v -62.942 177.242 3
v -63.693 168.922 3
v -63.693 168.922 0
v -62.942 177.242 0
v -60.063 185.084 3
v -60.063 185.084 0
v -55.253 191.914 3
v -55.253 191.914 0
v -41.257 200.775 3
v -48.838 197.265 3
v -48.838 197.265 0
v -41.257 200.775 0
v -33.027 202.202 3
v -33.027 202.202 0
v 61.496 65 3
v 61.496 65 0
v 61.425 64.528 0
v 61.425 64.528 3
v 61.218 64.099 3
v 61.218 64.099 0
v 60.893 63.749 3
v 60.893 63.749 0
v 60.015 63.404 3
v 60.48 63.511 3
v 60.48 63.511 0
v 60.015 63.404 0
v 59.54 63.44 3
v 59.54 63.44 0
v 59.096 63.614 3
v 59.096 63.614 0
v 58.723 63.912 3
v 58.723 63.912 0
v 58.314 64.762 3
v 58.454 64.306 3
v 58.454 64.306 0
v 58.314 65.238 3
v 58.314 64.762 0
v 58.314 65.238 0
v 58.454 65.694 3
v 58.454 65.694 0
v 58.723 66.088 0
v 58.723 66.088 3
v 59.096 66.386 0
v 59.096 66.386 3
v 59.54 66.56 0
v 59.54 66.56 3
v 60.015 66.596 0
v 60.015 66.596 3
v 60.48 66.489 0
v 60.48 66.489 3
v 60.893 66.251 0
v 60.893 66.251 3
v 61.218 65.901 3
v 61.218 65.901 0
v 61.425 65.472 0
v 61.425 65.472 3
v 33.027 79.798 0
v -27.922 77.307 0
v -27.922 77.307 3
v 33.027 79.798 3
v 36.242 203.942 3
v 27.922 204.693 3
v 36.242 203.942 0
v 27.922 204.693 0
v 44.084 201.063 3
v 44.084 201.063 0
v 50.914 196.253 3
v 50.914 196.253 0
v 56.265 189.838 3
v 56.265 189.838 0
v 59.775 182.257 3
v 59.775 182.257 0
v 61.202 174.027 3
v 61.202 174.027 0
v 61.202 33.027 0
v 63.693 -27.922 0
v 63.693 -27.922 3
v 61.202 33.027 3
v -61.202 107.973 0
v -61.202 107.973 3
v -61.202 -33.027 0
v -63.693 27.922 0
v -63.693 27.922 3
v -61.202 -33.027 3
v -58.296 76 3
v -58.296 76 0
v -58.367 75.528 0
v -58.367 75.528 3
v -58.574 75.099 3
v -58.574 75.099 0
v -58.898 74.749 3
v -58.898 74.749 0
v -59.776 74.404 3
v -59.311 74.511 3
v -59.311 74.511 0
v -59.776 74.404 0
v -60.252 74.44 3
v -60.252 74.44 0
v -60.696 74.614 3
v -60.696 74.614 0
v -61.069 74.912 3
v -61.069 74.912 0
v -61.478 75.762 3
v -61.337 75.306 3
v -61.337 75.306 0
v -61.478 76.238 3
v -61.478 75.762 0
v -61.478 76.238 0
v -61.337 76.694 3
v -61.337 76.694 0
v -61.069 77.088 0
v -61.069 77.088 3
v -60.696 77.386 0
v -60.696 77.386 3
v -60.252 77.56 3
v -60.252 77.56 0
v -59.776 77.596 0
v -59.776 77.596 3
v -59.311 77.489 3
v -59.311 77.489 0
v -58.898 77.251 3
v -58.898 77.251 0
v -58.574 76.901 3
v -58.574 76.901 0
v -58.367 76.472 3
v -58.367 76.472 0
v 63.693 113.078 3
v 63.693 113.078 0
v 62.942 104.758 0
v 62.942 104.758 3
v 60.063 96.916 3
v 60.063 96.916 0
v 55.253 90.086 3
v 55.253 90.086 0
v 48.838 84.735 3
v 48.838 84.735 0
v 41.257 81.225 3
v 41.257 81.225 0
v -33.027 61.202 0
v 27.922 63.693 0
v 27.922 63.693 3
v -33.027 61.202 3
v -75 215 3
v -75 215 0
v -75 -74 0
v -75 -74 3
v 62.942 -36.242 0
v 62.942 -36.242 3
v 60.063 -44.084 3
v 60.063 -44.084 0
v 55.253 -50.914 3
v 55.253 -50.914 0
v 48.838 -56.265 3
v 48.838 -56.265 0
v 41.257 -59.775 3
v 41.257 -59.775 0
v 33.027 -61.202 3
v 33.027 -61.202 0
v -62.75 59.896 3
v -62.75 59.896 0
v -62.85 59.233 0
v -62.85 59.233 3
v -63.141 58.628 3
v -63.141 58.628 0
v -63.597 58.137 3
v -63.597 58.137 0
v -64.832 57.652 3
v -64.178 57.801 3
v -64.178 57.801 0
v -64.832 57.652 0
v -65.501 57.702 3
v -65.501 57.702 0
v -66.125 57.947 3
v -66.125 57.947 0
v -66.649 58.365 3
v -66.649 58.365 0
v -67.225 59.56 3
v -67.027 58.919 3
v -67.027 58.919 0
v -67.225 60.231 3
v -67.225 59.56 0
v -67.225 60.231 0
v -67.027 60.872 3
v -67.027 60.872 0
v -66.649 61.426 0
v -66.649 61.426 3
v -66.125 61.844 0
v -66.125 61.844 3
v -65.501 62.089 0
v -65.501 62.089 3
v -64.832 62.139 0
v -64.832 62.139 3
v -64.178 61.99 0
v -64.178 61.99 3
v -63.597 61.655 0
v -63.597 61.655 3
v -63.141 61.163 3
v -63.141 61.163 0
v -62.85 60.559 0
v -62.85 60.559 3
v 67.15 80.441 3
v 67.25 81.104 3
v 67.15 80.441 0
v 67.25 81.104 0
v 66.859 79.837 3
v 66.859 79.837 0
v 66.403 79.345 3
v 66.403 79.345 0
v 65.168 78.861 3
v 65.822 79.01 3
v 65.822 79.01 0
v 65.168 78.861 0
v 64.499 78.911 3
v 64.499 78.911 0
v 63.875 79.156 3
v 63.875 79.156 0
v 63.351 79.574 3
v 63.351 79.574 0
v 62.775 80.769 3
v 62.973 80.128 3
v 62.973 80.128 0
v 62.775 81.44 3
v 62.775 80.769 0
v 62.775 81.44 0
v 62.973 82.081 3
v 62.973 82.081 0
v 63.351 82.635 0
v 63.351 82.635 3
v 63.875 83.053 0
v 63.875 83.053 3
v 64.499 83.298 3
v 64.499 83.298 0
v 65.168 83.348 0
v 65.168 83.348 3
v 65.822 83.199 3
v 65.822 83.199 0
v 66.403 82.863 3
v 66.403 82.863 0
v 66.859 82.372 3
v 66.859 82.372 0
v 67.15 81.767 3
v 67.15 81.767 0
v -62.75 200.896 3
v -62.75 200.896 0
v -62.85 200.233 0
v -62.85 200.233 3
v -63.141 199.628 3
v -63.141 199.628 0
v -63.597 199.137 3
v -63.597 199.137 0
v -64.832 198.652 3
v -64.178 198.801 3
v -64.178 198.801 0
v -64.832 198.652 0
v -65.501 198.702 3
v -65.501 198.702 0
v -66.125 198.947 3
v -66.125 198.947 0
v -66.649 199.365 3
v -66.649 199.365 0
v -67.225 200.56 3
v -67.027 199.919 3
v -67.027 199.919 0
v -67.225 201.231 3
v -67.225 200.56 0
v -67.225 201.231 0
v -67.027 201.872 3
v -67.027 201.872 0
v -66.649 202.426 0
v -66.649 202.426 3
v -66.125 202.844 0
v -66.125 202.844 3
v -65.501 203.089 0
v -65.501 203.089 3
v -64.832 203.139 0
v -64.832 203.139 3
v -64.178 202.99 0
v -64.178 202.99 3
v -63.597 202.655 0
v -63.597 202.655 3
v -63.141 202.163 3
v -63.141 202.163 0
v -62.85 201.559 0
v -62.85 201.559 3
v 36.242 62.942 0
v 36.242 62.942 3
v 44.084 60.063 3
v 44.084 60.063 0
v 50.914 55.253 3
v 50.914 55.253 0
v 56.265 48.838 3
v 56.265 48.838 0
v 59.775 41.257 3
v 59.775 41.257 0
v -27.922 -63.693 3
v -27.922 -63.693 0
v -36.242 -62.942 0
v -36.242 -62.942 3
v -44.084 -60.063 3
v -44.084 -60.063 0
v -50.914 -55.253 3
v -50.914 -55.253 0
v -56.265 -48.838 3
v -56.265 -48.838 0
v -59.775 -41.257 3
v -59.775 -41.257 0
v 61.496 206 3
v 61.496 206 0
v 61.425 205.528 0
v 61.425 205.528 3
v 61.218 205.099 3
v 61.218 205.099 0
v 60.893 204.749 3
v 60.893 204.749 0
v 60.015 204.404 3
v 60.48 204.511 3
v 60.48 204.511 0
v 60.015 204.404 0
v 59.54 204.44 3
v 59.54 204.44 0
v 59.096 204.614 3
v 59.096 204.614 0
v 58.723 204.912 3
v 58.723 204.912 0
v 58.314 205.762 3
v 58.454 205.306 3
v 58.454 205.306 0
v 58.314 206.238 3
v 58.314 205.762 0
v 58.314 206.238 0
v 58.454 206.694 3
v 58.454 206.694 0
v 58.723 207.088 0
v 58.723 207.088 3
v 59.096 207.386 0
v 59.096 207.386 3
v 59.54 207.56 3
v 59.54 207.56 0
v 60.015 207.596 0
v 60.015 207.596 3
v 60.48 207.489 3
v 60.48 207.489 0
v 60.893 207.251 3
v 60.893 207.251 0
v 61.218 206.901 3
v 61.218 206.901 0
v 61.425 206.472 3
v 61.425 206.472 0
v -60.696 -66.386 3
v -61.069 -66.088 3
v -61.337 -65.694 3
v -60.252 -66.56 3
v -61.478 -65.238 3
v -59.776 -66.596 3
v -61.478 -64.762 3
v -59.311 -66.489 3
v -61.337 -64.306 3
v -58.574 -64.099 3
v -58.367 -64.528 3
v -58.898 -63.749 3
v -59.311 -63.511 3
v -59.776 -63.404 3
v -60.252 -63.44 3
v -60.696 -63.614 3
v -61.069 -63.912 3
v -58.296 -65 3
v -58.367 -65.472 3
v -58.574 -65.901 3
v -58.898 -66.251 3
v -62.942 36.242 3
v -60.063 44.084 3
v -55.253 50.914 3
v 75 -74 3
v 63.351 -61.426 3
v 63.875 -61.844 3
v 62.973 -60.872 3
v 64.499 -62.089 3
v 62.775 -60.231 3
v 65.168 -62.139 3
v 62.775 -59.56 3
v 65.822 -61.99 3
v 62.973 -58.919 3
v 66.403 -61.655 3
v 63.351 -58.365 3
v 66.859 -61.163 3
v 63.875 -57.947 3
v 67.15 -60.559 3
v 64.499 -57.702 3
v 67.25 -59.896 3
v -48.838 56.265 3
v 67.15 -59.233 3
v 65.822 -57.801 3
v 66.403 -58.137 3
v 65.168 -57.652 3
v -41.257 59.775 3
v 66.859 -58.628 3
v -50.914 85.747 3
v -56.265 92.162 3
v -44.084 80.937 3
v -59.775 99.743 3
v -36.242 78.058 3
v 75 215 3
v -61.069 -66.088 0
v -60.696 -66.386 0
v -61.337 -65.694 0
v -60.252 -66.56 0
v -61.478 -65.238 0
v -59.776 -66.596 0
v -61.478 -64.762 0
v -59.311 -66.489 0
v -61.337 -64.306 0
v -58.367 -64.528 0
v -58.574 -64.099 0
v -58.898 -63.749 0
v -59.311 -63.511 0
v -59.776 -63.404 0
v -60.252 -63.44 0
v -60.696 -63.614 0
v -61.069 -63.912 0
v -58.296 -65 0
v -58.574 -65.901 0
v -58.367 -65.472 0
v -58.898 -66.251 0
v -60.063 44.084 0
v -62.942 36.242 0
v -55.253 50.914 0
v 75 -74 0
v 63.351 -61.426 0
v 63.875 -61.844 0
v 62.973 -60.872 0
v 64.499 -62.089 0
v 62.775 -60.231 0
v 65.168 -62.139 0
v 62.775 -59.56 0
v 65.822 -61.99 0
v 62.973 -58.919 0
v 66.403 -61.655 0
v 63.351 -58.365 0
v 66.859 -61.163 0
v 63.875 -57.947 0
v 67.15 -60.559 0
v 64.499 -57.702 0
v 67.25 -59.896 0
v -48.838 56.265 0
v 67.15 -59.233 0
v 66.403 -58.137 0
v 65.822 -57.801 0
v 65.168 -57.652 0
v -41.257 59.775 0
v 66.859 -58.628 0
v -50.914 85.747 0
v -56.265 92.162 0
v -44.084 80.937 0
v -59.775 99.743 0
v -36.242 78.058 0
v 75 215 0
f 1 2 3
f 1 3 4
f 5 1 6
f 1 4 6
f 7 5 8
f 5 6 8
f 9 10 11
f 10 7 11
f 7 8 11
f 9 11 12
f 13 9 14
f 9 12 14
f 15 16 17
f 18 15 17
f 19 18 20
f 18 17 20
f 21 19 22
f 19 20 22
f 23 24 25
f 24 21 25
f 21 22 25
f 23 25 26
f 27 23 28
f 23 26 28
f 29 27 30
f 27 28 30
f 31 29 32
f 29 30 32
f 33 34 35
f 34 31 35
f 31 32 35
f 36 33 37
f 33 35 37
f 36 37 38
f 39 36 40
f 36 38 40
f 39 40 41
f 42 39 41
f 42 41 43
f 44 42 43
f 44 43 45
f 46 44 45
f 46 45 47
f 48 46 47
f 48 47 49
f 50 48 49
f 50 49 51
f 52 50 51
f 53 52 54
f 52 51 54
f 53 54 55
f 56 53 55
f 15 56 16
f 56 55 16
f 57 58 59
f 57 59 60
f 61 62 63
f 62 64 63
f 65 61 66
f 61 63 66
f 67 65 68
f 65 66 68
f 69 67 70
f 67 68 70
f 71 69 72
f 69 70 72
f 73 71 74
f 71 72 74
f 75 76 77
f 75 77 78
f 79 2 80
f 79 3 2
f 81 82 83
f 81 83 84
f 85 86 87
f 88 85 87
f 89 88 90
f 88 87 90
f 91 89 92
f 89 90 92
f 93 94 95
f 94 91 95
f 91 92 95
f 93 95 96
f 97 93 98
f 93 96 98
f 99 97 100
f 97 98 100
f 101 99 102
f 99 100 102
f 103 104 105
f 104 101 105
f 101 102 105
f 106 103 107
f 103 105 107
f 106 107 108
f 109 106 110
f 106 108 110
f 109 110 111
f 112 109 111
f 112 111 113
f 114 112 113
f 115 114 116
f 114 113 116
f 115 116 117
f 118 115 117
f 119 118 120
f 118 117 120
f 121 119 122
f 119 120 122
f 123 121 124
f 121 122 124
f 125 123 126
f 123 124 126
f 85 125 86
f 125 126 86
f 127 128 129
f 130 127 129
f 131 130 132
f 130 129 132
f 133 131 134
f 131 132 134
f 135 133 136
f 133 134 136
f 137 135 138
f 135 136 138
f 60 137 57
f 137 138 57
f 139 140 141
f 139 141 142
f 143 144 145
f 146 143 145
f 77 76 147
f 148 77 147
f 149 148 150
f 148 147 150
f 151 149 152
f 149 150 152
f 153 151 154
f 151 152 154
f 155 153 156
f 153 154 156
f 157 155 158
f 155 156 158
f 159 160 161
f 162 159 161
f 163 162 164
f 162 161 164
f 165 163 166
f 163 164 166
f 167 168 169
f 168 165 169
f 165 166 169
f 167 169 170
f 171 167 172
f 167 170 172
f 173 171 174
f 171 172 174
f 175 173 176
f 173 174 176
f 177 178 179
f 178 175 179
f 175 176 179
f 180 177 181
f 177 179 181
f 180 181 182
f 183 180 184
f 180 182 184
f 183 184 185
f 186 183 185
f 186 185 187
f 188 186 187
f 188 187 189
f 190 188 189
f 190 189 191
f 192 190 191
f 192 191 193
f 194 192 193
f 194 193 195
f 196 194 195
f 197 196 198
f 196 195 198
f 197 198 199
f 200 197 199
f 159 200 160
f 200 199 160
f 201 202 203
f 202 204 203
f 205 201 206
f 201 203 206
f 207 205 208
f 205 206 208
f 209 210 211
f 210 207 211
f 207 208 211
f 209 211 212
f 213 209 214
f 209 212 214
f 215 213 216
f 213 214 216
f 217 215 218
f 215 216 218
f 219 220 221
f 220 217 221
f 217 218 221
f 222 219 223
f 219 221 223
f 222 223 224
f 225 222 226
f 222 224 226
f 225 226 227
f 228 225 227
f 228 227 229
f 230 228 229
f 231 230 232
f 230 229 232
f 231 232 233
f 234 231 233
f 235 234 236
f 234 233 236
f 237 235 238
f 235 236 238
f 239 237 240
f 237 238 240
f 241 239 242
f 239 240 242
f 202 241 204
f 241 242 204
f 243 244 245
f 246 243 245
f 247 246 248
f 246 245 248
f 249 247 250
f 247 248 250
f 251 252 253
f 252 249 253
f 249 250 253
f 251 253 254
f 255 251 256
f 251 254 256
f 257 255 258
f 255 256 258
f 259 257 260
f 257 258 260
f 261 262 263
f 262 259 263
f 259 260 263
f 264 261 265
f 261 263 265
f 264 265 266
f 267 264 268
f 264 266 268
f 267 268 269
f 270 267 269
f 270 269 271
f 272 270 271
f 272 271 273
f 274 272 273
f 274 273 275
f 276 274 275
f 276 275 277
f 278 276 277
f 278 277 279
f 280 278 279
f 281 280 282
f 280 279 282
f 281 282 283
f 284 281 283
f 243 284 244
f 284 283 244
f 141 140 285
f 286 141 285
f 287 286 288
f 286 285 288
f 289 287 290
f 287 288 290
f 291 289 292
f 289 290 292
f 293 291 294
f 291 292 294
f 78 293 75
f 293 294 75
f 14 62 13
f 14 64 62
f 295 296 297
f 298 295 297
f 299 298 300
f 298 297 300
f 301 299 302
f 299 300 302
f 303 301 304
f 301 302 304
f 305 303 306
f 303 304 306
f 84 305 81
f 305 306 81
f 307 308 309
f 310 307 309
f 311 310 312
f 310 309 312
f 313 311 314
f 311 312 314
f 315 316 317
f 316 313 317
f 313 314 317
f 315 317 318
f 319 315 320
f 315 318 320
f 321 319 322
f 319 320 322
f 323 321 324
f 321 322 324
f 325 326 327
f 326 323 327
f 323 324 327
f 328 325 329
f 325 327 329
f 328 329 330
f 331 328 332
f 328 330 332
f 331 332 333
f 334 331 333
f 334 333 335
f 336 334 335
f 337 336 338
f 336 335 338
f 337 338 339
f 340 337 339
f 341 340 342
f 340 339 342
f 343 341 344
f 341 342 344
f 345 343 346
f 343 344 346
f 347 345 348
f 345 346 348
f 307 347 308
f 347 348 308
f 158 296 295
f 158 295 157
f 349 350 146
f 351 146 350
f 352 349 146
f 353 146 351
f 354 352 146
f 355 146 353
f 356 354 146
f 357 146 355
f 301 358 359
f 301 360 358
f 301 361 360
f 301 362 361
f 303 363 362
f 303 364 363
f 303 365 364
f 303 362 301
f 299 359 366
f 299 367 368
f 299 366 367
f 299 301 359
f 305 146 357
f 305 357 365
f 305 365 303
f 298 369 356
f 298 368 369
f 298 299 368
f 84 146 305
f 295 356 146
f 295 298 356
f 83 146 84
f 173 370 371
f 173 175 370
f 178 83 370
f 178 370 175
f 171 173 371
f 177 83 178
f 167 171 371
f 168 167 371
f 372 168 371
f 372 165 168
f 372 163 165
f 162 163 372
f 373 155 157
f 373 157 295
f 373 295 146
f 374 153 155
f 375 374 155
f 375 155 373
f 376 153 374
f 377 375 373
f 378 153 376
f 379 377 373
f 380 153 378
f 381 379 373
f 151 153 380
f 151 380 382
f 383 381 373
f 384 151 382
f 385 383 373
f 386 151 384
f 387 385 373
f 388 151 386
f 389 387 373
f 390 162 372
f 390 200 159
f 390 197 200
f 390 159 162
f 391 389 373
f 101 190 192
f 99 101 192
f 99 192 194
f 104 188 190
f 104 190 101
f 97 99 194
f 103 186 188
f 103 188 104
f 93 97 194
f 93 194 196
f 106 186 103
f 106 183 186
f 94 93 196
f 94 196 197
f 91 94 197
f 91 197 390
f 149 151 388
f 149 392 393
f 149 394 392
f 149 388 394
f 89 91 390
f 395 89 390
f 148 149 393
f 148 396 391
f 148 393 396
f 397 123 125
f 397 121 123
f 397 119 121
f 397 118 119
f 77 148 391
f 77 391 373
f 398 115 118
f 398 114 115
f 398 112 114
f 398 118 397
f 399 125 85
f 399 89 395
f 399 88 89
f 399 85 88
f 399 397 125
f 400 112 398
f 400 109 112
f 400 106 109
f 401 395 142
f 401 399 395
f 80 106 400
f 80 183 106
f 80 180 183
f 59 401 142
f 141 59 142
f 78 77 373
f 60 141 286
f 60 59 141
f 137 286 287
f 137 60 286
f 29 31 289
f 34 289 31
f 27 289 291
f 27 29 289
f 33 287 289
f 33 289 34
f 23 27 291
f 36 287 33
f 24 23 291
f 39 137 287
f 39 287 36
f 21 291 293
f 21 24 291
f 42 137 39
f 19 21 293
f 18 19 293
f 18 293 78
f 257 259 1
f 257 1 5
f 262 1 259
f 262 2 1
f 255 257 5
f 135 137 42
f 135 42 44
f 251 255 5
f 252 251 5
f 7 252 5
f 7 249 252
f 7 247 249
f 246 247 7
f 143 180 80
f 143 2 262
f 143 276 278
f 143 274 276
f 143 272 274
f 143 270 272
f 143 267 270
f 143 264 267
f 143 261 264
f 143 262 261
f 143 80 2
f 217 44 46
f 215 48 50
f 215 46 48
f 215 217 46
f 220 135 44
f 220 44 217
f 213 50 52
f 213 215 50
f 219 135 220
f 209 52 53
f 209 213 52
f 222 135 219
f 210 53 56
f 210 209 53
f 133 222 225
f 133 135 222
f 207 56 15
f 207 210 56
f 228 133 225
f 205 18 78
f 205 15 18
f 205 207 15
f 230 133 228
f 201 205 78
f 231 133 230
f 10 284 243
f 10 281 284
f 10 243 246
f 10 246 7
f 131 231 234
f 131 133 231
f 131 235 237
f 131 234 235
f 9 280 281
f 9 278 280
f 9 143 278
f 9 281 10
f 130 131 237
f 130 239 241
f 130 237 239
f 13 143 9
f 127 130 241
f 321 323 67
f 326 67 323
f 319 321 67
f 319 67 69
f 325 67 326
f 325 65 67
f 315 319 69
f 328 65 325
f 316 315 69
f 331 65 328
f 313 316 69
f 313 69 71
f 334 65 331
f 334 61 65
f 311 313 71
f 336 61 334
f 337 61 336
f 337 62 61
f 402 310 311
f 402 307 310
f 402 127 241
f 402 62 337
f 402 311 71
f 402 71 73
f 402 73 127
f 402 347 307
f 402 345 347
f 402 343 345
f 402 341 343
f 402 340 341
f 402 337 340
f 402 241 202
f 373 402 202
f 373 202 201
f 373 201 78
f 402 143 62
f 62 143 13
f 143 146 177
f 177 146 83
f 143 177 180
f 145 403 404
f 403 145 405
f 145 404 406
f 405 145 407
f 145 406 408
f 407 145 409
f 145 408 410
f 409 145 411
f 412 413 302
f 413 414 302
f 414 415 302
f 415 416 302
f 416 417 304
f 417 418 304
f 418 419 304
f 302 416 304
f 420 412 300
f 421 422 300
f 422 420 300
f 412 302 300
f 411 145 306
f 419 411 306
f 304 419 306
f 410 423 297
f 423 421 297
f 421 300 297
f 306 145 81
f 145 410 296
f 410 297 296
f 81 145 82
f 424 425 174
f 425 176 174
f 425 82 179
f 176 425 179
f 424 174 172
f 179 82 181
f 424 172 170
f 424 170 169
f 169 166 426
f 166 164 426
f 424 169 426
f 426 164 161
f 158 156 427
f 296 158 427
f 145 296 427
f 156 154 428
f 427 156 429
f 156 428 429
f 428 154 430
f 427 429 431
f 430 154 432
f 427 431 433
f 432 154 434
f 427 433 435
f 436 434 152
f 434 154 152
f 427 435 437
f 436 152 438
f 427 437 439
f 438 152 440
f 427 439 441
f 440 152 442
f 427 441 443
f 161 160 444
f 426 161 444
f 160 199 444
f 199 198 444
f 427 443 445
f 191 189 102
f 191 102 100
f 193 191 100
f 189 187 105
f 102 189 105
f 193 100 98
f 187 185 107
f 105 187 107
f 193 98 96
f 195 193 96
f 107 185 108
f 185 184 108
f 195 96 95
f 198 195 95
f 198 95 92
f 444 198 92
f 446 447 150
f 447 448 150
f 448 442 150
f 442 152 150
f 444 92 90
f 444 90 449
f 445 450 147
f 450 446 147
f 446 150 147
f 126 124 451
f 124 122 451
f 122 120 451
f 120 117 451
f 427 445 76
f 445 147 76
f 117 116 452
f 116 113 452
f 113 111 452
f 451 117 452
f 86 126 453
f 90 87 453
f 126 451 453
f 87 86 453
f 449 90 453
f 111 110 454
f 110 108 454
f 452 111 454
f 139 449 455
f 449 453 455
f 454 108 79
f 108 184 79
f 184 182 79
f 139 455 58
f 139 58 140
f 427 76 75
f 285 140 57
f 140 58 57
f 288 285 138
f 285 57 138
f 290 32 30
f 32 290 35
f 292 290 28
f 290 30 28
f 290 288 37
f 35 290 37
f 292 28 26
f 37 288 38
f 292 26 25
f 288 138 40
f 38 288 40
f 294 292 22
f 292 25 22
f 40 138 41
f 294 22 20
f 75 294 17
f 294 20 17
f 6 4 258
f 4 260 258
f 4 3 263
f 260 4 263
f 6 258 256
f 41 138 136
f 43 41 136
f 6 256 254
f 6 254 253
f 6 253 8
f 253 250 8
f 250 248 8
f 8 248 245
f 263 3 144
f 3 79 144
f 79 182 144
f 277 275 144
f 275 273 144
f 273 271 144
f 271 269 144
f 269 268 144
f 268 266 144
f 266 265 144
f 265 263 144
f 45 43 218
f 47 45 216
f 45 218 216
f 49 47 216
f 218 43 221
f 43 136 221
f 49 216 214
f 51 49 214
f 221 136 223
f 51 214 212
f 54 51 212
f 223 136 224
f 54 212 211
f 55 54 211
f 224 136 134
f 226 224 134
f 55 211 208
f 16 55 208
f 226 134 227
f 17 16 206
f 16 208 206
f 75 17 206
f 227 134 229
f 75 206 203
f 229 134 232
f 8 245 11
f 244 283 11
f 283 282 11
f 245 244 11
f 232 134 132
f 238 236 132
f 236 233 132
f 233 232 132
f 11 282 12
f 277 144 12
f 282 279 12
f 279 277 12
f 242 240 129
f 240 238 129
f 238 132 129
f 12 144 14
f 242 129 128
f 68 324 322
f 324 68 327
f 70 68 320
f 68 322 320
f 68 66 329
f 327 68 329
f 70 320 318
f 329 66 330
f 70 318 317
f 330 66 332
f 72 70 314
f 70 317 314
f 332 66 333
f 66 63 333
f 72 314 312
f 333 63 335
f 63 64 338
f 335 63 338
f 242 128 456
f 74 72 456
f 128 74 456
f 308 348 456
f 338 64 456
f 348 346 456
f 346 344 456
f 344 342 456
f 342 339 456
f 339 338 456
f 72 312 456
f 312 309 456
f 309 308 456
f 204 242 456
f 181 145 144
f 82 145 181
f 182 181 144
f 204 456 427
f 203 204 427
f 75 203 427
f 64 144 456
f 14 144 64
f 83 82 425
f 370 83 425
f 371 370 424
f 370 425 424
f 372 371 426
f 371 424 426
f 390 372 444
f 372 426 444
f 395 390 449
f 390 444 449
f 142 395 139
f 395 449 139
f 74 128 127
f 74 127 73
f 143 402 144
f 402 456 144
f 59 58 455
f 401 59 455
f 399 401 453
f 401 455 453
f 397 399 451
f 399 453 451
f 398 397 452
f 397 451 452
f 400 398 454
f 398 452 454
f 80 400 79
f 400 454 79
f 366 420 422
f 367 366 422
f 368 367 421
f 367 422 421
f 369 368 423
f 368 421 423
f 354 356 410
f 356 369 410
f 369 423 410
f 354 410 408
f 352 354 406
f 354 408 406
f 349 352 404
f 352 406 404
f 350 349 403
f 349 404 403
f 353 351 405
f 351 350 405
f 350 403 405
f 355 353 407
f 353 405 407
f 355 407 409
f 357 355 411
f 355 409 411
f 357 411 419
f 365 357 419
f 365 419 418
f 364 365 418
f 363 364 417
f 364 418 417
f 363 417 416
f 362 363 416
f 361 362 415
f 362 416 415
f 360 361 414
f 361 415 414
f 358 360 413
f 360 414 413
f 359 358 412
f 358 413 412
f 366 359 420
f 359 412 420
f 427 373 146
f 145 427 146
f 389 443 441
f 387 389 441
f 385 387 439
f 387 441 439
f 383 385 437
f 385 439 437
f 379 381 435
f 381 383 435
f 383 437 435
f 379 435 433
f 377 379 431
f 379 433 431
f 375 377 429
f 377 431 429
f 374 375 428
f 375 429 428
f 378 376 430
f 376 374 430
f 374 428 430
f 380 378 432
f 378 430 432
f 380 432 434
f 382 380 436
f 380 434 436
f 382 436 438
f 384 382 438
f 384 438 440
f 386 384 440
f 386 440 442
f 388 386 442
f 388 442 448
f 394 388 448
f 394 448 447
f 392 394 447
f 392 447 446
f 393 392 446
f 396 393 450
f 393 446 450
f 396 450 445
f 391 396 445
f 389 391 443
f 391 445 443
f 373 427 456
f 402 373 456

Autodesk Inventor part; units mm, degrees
ref_plane "YZ Plane" through (0, 0, 0) normal (1, 0, 0) x (0, 1, 0)
ref_plane "XZ Plane" through (0, 0, 0) normal (0, 1, 0) x (-1, 0, 0)
ref_plane "XY Plane" through (0, 0, 0) normal (0, 0, 1) x (1, 0, 0)
sketch "スケッチ1" plane through (0, 0, 0) normal (0, 0, 1) x (1, 0, 0)
  line L0 (-75, -215) -> (75, -215)
  line L1 (75, -215) -> (75, 215)
  line L2 (75, 215) -> (-75, 215)
  line L3 (-75, 215) -> (-75, -215)
  line L4 (-75, -215) -> (75, 215) construction
  line L5 (75, -215) -> (-75, 215) construction
  line L6 (-65, -215) -> (-65, 215) construction
  line L7 (-65, 59.8957) -> (59.8957, 65) construction
  line L8 (59.8957, 65) -> (65, -59.8957) construction
  line L9 (65, -59.8957) -> (-59.8957, -65) construction
  line L10 (-59.8957, -65) -> (-65, 59.8957) construction
  line L11 (-65, 59.8957) -> (65, -59.8957) construction
  line L12 (59.8957, 65) -> (-59.8957, -65) construction
  circle A0 centre (-65, 59.8957) radius 2.25
  line L13 (-67.0832, -72.8) -> (72.8, -67.0832) construction
  line L14 (72.8, -67.0832) -> (67.0832, 72.8) construction
  line L15 (67.0832, 72.8) -> (-72.8, 67.0832) construction
  line L16 (-72.8, 67.0832) -> (-67.0832, -72.8) construction
  line L17 (-67.0832, -72.8) -> (67.0832, 72.8) construction
  line L18 (72.8, -67.0832) -> (-72.8, 67.0832) construction
  line L19 (0, 0) -> (0, 70.0584) construction
  circle A1 centre (65, -59.8957) radius 2.25
  circle A2 centre (59.8957, 65) radius 1.6
  circle A3 centre (-59.8957, -65) radius 1.6
  line L20 (-63.6933, 27.9224) -> (-61.2024, -33.0267)
  line L21 (-27.9224, -63.6933) -> (33.0267, -61.2024)
  line L22 (63.6933, -27.9224) -> (61.2024, 33.0267)
  line L23 (27.9224, 63.6933) -> (-33.0267, 61.2024)
  line L24 (-62.4479, -2.5521) -> (62.4479, 2.5521) construction
  arc A4 (-33.0267, 61.2024) -> (-63.6933, 27.9224) centre (-31.72, 29.2291) ccw
  arc A5 (61.2024, 33.0267) -> (27.9224, 63.6933) centre (29.2291, 31.72) ccw
  arc A6 (33.0267, -61.2024) -> (63.6933, -27.9224) centre (31.72, -29.2291) ccw
  arc A7 (-61.2024, -33.0267) -> (-27.9224, -63.6933) centre (-29.2291, -31.72) ccw
  circle A8 centre (-65, -81.1043) radius 2.25
  circle A9 centre (-59.8957, -206) radius 1.6
  circle A10 centre (65, -200.8957) radius 2.25
  circle A11 centre (59.8957, -76) radius 1.6
  arc A12 (61.2024, -107.9733) -> (27.9224, -77.3067) centre (29.2291, -109.28) ccw
  line L25 (27.9224, -77.3067) -> (-33.0267, -79.7976)
  arc A13 (-33.0267, -79.7976) -> (-63.6933, -113.0776) centre (-31.72, -111.7709) ccw
  line L26 (-63.6933, -113.0776) -> (-61.2024, -174.0267)
  arc A14 (-61.2024, -174.0267) -> (-27.9224, -204.6933) centre (-29.2291, -172.72) ccw
  line L27 (-27.9224, -204.6933) -> (33.0267, -202.2024)
  arc A15 (33.0267, -202.2024) -> (63.6933, -168.9224) centre (31.72, -170.2291) ccw
  line L28 (63.6933, -168.9224) -> (61.2024, -107.9733)
  circle A16 centre (-65, 200.8957) radius 2.25
  circle A17 centre (-59.8957, 76) radius 1.6
  circle A18 centre (65, 81.1043) radius 2.25
  circle A19 centre (59.8957, 206) radius 1.6
  arc A20 (61.2024, 174.0267) -> (27.9224, 204.6933) centre (29.2291, 172.72) ccw
  line L29 (27.9224, 204.6933) -> (-33.0267, 202.2024)
  arc A21 (-33.0267, 202.2024) -> (-63.6933, 168.9224) centre (-31.72, 170.2291) ccw
  line L30 (-63.6933, 168.9224) -> (-61.2024, 107.9733)
  arc A22 (-61.2024, 107.9733) -> (-27.9224, 77.3067) centre (-29.2291, 109.28) ccw
  line L31 (-27.9224, 77.3067) -> (33.0267, 79.7976)
  arc A23 (33.0267, 79.7976) -> (63.6933, 113.0776) centre (31.72, 111.7709) ccw
  line L32 (63.6933, 113.0776) -> (61.2024, 174.0267)
  circle A24 centre (-65, 59.8957) radius 2.25
  circle A25 centre (-59.8957, -65) radius 1.6
  circle A26 centre (65, -59.8957) radius 2.25
  circle A27 centre (59.8957, 65) radius 1.6
  arc A28 (61.2024, 33.0267) -> (27.9224, 63.6933) centre (29.2291, 31.72) ccw
  line L33 (27.9224, 63.6933) -> (-33.0267, 61.2024)
  arc A29 (-33.0267, 61.2024) -> (-63.6933, 27.9224) centre (-31.72, 29.2291) ccw
  line L34 (-63.6933, 27.9224) -> (-61.2024, -33.0267)
  arc A30 (-61.2024, -33.0267) -> (-27.9224, -63.6933) centre (-29.2291, -31.72) ccw
  line L35 (-27.9224, -63.6933) -> (33.0267, -61.2024)
  arc A31 (33.0267, -61.2024) -> (63.6933, -27.9224) centre (31.72, -29.2291) ccw
  line L36 (63.6933, -27.9224) -> (61.2024, 33.0267)
  point P0 (-65, 59.8957)
  point P1 (59.8957, 65)
  point P2 (-65, -81.1043)
  point P3 (59.8957, -76)
  point P4 (-62.4479, -143.5521)
  point P5 (62.4479, -138.4479)
  point P6 (-65, 200.8957)
  point P7 (59.8957, 206)
  point P8 (-62.4479, 138.4479)
  point P9 (62.4479, 143.5521)
  point P10 (-65, 59.8957)
  point P11 (59.8957, 65)
  dimension "d0" = 150
  dimension "d1" = 430
  dimension "d3" = 65
  dimension "d4" = 125
  dimension "d7" = 4.5
  dimension "d8" = 140
  dimension "d9" = 70.0584
  dimension "d10" = 3.2
  dimension "d24" = 125
  dimension "d25" = 32
  dimension "d28" = 141
  dimension "d31" = 141
extrude "押し出し1" add sketch "スケッチ1" along normal blind 3 contours L3 L2 L1 L0 | A8 | A9 | A10 | A11
sketch "スケッチ4" plane through (0, 0, 3) normal (0, 0, 1) x (1, 0, 0)
  line L0 (-75, -215) -> (75, -215) construction
  line L1 (-75, -215) -> (75, -215)
  line L2 (75, -215) -> (75, -74)
  line L3 (75, -74) -> (-75, -74)
  line L4 (-75, -74) -> (-75, -215)
  point P0 (0, 0)
  dimension "d43" = 141
extrude "押し出し3" cut sketch "スケッチ4" against normal through all
properties part number "top_140mm" material "アルミニウム 6061"
